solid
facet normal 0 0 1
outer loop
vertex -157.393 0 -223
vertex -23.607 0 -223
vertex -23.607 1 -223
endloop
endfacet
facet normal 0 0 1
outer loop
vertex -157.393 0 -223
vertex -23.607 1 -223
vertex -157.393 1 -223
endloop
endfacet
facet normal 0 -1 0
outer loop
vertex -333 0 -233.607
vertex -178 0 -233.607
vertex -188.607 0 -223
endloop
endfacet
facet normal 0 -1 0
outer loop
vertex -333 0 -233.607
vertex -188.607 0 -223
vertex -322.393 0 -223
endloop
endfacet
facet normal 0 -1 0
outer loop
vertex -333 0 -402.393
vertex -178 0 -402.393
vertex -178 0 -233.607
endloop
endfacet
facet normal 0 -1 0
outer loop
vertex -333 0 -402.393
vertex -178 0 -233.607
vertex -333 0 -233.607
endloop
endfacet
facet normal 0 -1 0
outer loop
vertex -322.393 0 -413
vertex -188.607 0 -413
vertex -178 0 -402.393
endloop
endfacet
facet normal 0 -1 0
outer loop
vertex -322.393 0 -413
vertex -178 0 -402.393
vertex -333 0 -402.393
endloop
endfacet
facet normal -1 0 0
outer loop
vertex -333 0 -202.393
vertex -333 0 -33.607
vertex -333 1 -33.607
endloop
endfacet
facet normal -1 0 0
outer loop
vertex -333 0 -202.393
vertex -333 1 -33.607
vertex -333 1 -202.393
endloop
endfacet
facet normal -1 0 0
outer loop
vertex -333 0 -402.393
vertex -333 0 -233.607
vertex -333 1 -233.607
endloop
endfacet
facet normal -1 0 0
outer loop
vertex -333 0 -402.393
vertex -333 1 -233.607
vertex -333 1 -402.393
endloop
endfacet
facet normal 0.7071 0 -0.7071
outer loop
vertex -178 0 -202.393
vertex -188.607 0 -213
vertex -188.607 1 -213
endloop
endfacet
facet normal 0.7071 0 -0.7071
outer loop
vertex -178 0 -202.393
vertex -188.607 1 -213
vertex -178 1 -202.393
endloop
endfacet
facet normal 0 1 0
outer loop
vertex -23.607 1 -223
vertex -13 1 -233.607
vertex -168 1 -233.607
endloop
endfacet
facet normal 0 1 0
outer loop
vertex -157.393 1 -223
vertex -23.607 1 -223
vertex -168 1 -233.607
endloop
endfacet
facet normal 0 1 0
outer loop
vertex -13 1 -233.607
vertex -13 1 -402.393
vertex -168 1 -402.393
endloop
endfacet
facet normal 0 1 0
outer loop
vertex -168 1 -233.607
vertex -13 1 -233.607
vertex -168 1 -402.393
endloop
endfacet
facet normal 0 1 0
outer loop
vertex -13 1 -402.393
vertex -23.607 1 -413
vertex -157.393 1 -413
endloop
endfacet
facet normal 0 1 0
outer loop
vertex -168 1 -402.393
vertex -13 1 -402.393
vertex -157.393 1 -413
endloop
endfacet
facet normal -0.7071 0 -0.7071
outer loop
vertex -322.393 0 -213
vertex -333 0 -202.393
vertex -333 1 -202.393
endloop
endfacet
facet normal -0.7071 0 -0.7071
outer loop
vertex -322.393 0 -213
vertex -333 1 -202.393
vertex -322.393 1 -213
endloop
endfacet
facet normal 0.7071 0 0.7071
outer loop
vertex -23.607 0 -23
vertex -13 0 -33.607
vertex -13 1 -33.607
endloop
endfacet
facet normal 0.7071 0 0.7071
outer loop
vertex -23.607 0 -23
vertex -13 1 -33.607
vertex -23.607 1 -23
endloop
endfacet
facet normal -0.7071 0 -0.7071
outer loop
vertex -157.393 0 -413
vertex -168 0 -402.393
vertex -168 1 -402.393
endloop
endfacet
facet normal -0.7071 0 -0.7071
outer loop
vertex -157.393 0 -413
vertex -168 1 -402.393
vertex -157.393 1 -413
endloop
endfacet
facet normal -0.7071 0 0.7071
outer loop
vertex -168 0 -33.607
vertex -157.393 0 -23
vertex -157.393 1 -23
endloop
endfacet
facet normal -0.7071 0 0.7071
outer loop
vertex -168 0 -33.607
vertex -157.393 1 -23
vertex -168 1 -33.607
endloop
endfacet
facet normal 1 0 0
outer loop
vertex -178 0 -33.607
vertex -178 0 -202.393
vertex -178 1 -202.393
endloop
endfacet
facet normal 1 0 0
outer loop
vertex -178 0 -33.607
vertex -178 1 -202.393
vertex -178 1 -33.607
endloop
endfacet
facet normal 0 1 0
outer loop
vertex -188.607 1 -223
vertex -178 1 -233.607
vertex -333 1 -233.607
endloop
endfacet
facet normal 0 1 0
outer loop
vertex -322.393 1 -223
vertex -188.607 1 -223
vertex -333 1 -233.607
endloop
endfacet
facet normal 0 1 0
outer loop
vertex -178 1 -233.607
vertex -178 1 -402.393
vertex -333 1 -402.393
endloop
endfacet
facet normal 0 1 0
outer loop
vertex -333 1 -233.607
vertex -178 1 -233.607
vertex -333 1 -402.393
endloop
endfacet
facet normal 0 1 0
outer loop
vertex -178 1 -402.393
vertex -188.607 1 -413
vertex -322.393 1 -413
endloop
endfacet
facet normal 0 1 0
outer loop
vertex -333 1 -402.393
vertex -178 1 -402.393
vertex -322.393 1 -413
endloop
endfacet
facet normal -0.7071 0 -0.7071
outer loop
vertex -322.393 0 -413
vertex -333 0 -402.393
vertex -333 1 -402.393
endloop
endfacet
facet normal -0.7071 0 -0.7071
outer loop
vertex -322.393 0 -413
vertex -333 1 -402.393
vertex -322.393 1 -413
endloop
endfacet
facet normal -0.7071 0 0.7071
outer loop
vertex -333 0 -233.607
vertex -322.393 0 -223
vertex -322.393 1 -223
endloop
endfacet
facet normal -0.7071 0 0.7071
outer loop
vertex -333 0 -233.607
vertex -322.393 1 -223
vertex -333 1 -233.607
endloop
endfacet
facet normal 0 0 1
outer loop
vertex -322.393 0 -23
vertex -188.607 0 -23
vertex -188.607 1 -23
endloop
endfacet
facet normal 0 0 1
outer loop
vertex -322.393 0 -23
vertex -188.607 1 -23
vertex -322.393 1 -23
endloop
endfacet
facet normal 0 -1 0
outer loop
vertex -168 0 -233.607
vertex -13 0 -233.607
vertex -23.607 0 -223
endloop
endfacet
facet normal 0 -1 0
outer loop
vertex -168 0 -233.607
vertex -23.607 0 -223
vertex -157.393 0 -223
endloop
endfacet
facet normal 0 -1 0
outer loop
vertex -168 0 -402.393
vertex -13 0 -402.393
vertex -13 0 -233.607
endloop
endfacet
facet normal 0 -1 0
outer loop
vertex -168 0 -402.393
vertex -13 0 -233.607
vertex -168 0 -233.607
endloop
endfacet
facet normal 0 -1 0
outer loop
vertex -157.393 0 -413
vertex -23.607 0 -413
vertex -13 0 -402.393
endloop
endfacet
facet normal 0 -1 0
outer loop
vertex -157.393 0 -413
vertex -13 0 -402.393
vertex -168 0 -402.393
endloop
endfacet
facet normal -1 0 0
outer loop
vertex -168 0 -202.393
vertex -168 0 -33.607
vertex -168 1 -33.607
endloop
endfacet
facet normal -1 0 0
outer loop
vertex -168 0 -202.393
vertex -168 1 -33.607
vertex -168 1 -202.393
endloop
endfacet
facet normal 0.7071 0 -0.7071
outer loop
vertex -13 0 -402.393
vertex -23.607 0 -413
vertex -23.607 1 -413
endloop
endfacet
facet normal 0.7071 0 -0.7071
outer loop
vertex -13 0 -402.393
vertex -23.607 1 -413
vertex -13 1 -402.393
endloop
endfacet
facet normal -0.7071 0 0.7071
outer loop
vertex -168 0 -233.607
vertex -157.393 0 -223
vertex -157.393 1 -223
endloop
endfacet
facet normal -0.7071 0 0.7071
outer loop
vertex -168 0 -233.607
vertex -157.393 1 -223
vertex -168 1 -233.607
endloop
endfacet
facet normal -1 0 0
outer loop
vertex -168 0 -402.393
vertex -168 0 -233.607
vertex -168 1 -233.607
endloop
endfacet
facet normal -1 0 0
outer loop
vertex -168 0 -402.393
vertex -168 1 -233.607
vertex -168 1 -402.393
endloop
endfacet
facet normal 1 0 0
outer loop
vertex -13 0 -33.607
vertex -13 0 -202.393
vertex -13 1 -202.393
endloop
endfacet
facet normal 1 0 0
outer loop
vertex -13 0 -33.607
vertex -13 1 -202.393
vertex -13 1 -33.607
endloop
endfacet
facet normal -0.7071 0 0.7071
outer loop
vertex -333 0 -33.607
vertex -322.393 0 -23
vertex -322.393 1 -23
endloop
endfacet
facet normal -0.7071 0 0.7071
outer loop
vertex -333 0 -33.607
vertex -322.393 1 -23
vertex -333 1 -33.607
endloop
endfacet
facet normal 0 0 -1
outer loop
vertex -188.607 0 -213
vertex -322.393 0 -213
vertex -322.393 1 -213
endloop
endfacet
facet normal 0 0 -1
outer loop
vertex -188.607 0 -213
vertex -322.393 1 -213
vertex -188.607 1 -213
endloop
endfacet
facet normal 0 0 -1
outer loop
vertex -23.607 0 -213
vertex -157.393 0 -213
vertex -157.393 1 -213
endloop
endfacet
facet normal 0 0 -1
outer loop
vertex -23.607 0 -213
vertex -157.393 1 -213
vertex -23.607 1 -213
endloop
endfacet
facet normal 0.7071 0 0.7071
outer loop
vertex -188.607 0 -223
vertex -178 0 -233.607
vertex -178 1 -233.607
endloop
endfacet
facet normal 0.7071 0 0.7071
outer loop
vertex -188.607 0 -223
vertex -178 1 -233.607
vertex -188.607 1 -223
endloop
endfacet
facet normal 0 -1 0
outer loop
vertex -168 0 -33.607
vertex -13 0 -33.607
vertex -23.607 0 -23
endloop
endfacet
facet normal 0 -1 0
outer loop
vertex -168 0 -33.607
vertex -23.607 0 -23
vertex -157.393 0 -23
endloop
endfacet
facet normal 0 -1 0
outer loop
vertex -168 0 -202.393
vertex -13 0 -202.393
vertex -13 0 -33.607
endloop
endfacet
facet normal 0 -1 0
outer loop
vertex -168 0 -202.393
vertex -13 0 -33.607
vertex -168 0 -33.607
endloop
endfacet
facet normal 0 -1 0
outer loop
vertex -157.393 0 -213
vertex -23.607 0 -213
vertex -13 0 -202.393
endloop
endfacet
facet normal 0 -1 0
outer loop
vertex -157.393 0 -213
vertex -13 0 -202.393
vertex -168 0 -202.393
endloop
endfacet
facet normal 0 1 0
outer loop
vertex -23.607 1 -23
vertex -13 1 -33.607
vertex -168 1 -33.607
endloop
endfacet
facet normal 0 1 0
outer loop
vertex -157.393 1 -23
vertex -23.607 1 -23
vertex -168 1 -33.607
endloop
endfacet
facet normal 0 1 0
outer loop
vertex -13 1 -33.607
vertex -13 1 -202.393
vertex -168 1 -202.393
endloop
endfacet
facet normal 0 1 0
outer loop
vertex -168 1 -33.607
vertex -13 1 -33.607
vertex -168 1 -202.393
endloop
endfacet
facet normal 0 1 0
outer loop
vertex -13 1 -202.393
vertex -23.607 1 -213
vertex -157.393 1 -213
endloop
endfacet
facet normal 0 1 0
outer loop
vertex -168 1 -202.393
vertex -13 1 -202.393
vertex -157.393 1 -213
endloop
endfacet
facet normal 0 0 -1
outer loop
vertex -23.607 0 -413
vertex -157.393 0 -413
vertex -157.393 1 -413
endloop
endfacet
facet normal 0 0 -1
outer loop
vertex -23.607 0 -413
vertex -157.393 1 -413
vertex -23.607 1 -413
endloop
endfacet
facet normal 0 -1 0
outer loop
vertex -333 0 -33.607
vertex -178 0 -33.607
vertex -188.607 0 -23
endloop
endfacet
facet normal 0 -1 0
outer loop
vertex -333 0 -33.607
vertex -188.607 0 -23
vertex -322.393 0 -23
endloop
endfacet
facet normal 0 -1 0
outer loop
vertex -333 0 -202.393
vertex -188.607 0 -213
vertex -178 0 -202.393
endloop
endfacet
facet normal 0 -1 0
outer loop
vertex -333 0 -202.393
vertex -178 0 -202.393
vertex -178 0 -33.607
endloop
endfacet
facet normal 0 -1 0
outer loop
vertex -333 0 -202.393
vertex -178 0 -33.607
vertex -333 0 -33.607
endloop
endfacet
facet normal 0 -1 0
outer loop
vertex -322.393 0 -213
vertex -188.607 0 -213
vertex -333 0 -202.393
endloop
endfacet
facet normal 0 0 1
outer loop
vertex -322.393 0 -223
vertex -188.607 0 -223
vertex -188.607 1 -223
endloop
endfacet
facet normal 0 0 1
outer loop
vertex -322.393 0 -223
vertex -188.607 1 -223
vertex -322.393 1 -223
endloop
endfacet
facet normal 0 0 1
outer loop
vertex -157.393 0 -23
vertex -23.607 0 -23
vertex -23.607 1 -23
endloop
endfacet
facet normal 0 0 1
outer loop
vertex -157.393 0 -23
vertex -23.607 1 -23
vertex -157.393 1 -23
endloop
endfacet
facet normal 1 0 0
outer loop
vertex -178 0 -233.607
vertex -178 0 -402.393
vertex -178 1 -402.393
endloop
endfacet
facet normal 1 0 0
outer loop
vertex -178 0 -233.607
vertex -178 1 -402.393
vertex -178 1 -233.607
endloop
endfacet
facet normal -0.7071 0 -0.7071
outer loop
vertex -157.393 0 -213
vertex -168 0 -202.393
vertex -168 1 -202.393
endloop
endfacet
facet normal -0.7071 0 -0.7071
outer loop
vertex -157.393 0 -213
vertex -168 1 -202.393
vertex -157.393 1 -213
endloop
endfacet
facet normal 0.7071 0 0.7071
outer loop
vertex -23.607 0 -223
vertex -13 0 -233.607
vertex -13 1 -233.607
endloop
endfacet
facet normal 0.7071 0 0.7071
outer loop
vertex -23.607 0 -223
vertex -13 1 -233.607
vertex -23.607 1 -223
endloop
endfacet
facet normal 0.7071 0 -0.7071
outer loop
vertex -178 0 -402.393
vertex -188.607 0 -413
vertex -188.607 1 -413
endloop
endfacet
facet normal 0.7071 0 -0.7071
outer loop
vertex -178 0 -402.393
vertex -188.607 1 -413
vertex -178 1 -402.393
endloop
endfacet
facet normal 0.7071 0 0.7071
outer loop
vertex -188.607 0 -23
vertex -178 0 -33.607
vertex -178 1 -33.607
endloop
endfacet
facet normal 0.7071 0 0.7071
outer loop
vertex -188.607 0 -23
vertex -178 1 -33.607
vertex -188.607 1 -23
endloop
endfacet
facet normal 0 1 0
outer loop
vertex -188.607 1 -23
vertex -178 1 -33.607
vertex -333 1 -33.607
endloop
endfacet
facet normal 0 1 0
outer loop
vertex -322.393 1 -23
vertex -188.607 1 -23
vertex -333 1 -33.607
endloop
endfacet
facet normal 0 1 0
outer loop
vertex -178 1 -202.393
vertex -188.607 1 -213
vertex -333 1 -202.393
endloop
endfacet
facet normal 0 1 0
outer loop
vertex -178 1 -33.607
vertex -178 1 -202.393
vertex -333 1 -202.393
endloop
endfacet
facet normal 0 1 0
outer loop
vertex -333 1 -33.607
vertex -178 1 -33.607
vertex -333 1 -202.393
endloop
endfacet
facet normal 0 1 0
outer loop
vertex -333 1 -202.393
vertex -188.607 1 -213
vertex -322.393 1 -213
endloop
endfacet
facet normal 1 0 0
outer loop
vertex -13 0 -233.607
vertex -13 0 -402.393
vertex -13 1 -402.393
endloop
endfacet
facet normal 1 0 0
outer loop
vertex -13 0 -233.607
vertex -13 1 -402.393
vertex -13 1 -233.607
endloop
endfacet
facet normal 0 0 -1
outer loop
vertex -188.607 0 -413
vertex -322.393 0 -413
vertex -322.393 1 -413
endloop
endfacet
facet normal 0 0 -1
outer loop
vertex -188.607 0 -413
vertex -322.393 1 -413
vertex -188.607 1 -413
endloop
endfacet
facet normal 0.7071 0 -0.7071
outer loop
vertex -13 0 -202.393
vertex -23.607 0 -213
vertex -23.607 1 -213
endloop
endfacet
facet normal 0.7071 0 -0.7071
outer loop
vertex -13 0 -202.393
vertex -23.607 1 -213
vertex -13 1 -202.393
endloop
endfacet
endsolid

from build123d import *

# Parameters (mm, degrees)
BOSS_EXTRUDE1_DEPTH   = 1
BOSS_EXTRUDE1_2_DEPTH = 1
BOSS_EXTRUDE1_3_DEPTH = 1
BOSS_EXTRUDE1_4_DEPTH = 1


with BuildPart() as part:
    # Sketch1 → Boss-Extrude1 (new body)
    with BuildSketch(Plane(origin=(0, 0, 0), x_dir=(1, 0, 0), z_dir=(0, 1, 0))):
        Polygon((-168, 202.393398282), (-157.393398282, 213), (-23.606601718, 213), (-13, 202.393398282), (-13, 33.606601718), (-23.606601718, 23), (-157.393398282, 23), (-168, 33.606601718), align=None)
    extrude(amount=BOSS_EXTRUDE1_DEPTH)


with BuildPart() as body_2:
    # Sketch1 → Boss-Extrude1 2 (new body)
    with BuildSketch(Plane(origin=(0, 0, 0), x_dir=(1, 0, 0), z_dir=(0, 1, 0))):
        Polygon((-333, 202.393398282), (-322.393398282, 213), (-188.606601718, 213), (-178, 202.393398282), (-178, 33.606601718), (-188.606601718, 23), (-322.393398282, 23), (-333, 33.606601718), align=None)
    extrude(amount=BOSS_EXTRUDE1_2_DEPTH)


with BuildPart() as body_3:
    # Sketch1 → Boss-Extrude1 3 (new body)
    with BuildSketch(Plane(origin=(0, 0, 0), x_dir=(1, 0, 0), z_dir=(0, 1, 0))):
        Polygon((-333, 402.393398282), (-322.393398282, 413), (-188.606601718, 413), (-178, 402.393398282), (-178, 233.606601718), (-188.606601718, 223), (-322.393398282, 223), (-333, 233.606601718), align=None)
    extrude(amount=BOSS_EXTRUDE1_3_DEPTH)


with BuildPart() as body_4:
    # Sketch1 → Boss-Extrude1 4 (new body)
    with BuildSketch(Plane(origin=(0, 0, 0), x_dir=(1, 0, 0), z_dir=(0, 1, 0))):
        Polygon((-168, 402.393398282), (-157.393398282, 413), (-23.606601718, 413), (-13, 402.393398282), (-13, 233.606601718), (-23.606601718, 223), (-157.393398282, 223), (-168, 233.606601718), align=None)
    extrude(amount=BOSS_EXTRUDE1_4_DEPTH)


solid = Compound([part.part, body_2.part, body_3.part, body_4.part])
